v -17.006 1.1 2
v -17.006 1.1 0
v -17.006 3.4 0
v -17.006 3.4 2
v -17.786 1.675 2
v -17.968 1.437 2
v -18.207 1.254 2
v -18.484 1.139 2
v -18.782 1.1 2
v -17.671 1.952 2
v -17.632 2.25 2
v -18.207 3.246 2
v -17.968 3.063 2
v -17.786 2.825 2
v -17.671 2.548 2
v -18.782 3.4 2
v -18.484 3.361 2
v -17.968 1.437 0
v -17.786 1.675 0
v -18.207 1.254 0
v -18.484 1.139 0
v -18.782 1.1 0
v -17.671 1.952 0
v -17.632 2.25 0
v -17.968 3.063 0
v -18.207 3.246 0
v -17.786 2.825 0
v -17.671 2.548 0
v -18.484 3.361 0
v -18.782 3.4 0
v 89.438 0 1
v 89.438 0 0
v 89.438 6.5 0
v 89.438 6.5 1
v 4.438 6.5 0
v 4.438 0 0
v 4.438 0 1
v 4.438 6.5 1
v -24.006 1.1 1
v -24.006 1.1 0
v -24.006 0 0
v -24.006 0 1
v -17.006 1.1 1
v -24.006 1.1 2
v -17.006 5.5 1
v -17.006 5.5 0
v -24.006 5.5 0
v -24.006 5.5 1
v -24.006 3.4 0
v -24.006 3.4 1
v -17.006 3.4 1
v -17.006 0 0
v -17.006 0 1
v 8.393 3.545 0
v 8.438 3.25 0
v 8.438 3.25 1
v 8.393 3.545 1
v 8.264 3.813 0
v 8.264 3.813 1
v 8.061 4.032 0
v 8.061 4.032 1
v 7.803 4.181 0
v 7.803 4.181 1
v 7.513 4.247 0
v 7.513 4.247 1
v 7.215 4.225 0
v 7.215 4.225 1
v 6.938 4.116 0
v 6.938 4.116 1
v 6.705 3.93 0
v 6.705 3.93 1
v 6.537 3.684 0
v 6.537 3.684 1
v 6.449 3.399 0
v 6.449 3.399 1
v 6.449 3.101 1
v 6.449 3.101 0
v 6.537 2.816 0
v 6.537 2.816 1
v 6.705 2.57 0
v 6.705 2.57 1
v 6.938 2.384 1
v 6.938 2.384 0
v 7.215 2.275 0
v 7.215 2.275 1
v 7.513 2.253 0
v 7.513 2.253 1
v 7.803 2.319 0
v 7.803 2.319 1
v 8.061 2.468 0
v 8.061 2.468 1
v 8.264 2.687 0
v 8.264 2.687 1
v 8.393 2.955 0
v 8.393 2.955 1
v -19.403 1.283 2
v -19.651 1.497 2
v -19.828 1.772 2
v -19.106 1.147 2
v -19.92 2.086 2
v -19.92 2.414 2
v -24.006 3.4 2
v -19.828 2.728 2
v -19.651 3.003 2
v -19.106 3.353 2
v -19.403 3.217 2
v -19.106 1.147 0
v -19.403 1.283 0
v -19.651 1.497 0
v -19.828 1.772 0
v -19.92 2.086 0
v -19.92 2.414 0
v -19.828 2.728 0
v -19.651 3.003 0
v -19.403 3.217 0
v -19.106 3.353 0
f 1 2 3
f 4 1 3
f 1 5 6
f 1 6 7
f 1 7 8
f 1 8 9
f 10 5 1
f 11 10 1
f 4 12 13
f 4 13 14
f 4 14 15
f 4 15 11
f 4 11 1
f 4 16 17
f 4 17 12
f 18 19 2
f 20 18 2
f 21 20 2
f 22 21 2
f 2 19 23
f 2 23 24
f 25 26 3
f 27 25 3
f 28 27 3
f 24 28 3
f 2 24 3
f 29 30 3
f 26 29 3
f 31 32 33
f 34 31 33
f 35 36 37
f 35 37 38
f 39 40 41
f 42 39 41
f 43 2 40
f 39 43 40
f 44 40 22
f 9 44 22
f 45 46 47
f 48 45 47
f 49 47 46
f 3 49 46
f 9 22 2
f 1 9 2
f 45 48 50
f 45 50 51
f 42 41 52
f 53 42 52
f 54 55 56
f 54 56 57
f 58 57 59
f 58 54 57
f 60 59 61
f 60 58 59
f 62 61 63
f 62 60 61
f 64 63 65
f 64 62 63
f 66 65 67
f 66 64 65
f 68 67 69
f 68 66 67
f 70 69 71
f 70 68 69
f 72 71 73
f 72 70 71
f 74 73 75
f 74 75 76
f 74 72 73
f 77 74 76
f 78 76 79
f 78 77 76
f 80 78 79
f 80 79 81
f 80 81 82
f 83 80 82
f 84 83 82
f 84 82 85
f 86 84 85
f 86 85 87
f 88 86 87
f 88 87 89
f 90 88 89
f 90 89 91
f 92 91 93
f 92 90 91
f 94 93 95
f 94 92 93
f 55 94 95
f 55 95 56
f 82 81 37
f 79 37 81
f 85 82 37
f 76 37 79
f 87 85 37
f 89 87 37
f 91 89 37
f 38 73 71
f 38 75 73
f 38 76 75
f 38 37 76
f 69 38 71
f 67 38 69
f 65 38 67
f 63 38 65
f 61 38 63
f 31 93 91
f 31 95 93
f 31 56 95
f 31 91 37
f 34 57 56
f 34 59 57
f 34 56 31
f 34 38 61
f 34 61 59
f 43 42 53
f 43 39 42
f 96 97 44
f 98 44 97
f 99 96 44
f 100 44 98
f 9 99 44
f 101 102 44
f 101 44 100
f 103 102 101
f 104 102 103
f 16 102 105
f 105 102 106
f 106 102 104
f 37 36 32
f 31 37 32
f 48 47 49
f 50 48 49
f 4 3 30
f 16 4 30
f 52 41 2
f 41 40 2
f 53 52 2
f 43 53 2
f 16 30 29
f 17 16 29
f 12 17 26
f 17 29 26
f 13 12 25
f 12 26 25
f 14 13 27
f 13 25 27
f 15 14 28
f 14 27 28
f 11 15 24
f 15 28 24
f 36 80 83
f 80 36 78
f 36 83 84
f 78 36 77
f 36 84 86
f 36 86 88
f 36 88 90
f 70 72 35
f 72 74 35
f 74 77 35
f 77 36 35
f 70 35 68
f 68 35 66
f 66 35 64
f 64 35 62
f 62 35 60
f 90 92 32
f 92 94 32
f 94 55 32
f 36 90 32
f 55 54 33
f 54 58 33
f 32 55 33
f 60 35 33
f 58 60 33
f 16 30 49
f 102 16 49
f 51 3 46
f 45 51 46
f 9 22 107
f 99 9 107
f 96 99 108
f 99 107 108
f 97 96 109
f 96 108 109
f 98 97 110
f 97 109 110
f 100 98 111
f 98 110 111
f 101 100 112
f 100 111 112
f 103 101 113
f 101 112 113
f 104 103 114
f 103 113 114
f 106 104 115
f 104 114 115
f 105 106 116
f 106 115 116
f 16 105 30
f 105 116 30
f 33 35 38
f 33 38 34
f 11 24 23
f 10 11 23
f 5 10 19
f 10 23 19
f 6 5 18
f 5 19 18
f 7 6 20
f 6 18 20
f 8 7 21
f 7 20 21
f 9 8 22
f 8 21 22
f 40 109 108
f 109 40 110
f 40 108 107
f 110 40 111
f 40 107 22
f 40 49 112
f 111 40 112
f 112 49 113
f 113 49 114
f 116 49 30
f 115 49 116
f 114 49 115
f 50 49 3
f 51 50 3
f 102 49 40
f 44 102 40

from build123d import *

# Parameters (mm, degrees)
F0_W     = 85
F0_H     = 6.5
F0_R     = 1
F1_DEPTH = 1
F3_DEPTH = 1
F4_DEPTH = 2


with BuildPart() as f1:
    # F0 (on Top) → F1 (new body)
    with BuildSketch(Plane.XY):
        with Locations((46.937780939, 3.25)):
            Rectangle(F0_W, F0_H)
        with Locations((7.437780939, 3.25)):
            Circle(F0_R, mode=Mode.SUBTRACT)
    extrude(amount=F1_DEPTH)


with BuildPart() as f3:
    # F2 (on Top) → F3 (new body)
    with BuildSketch(Plane.XY):
        Polygon((-18.7815961412, 3.4), (-17.0057911724, 3.4), (-17.0057911724, 5.5), (-24.0057911724, 5.5), (-24.0057911724, 3.4), align=None)
    extrude(amount=F3_DEPTH)


with BuildPart() as f3b:
    # F2 (on Top) → F3, piece 2 (new body)
    with BuildSketch(Plane.XY):
        Polygon((-24.0057911724, 0), (-17.0057911724, 0), (-17.0057911724, 1.1), (-18.7815961412, 1.1), (-24.0057911724, 1.1), align=None)
    extrude(amount=F3_DEPTH)


with BuildPart() as f4:
    # F2 (on Top) → F4 (new body)
    with BuildSketch(Plane.XY):
        with BuildLine():
            Line((-24.0057911724, 3.4), (-24.0057911724, 1.1))
            Line((-24.0057911724, 1.1), (-18.7815961412, 1.1))
            ThreePointArc((-18.7815961412, 1.1), (-19.9315961412, 2.25), (-18.7815961412, 3.4))
            Line((-18.7815961412, 3.4), (-24.0057911724, 3.4))
        make_face()
    extrude(amount=F4_DEPTH)


with BuildPart() as f4b:
    # F2 (on Top) → F4, piece 2 (new body)
    with BuildSketch(Plane.XY):
        with BuildLine():
            Line((-18.7815961412, 1.1), (-17.0057911724, 1.1))
            Line((-17.0057911724, 1.1), (-17.0057911724, 3.4))
            Line((-17.0057911724, 3.4), (-18.7815961412, 3.4))
            ThreePointArc((-18.7815961412, 3.4), (-17.9684233429, 3.0631727984), (-17.6315961412, 2.25))
            ThreePointArc((-17.6315961412, 2.25), (-17.9684233429, 1.4368272016), (-18.7815961412, 1.1))
        make_face()
    extrude(amount=F4_DEPTH)


solid = Compound([f1.part, f3.part, f3b.part, f4.part, f4b.part])
